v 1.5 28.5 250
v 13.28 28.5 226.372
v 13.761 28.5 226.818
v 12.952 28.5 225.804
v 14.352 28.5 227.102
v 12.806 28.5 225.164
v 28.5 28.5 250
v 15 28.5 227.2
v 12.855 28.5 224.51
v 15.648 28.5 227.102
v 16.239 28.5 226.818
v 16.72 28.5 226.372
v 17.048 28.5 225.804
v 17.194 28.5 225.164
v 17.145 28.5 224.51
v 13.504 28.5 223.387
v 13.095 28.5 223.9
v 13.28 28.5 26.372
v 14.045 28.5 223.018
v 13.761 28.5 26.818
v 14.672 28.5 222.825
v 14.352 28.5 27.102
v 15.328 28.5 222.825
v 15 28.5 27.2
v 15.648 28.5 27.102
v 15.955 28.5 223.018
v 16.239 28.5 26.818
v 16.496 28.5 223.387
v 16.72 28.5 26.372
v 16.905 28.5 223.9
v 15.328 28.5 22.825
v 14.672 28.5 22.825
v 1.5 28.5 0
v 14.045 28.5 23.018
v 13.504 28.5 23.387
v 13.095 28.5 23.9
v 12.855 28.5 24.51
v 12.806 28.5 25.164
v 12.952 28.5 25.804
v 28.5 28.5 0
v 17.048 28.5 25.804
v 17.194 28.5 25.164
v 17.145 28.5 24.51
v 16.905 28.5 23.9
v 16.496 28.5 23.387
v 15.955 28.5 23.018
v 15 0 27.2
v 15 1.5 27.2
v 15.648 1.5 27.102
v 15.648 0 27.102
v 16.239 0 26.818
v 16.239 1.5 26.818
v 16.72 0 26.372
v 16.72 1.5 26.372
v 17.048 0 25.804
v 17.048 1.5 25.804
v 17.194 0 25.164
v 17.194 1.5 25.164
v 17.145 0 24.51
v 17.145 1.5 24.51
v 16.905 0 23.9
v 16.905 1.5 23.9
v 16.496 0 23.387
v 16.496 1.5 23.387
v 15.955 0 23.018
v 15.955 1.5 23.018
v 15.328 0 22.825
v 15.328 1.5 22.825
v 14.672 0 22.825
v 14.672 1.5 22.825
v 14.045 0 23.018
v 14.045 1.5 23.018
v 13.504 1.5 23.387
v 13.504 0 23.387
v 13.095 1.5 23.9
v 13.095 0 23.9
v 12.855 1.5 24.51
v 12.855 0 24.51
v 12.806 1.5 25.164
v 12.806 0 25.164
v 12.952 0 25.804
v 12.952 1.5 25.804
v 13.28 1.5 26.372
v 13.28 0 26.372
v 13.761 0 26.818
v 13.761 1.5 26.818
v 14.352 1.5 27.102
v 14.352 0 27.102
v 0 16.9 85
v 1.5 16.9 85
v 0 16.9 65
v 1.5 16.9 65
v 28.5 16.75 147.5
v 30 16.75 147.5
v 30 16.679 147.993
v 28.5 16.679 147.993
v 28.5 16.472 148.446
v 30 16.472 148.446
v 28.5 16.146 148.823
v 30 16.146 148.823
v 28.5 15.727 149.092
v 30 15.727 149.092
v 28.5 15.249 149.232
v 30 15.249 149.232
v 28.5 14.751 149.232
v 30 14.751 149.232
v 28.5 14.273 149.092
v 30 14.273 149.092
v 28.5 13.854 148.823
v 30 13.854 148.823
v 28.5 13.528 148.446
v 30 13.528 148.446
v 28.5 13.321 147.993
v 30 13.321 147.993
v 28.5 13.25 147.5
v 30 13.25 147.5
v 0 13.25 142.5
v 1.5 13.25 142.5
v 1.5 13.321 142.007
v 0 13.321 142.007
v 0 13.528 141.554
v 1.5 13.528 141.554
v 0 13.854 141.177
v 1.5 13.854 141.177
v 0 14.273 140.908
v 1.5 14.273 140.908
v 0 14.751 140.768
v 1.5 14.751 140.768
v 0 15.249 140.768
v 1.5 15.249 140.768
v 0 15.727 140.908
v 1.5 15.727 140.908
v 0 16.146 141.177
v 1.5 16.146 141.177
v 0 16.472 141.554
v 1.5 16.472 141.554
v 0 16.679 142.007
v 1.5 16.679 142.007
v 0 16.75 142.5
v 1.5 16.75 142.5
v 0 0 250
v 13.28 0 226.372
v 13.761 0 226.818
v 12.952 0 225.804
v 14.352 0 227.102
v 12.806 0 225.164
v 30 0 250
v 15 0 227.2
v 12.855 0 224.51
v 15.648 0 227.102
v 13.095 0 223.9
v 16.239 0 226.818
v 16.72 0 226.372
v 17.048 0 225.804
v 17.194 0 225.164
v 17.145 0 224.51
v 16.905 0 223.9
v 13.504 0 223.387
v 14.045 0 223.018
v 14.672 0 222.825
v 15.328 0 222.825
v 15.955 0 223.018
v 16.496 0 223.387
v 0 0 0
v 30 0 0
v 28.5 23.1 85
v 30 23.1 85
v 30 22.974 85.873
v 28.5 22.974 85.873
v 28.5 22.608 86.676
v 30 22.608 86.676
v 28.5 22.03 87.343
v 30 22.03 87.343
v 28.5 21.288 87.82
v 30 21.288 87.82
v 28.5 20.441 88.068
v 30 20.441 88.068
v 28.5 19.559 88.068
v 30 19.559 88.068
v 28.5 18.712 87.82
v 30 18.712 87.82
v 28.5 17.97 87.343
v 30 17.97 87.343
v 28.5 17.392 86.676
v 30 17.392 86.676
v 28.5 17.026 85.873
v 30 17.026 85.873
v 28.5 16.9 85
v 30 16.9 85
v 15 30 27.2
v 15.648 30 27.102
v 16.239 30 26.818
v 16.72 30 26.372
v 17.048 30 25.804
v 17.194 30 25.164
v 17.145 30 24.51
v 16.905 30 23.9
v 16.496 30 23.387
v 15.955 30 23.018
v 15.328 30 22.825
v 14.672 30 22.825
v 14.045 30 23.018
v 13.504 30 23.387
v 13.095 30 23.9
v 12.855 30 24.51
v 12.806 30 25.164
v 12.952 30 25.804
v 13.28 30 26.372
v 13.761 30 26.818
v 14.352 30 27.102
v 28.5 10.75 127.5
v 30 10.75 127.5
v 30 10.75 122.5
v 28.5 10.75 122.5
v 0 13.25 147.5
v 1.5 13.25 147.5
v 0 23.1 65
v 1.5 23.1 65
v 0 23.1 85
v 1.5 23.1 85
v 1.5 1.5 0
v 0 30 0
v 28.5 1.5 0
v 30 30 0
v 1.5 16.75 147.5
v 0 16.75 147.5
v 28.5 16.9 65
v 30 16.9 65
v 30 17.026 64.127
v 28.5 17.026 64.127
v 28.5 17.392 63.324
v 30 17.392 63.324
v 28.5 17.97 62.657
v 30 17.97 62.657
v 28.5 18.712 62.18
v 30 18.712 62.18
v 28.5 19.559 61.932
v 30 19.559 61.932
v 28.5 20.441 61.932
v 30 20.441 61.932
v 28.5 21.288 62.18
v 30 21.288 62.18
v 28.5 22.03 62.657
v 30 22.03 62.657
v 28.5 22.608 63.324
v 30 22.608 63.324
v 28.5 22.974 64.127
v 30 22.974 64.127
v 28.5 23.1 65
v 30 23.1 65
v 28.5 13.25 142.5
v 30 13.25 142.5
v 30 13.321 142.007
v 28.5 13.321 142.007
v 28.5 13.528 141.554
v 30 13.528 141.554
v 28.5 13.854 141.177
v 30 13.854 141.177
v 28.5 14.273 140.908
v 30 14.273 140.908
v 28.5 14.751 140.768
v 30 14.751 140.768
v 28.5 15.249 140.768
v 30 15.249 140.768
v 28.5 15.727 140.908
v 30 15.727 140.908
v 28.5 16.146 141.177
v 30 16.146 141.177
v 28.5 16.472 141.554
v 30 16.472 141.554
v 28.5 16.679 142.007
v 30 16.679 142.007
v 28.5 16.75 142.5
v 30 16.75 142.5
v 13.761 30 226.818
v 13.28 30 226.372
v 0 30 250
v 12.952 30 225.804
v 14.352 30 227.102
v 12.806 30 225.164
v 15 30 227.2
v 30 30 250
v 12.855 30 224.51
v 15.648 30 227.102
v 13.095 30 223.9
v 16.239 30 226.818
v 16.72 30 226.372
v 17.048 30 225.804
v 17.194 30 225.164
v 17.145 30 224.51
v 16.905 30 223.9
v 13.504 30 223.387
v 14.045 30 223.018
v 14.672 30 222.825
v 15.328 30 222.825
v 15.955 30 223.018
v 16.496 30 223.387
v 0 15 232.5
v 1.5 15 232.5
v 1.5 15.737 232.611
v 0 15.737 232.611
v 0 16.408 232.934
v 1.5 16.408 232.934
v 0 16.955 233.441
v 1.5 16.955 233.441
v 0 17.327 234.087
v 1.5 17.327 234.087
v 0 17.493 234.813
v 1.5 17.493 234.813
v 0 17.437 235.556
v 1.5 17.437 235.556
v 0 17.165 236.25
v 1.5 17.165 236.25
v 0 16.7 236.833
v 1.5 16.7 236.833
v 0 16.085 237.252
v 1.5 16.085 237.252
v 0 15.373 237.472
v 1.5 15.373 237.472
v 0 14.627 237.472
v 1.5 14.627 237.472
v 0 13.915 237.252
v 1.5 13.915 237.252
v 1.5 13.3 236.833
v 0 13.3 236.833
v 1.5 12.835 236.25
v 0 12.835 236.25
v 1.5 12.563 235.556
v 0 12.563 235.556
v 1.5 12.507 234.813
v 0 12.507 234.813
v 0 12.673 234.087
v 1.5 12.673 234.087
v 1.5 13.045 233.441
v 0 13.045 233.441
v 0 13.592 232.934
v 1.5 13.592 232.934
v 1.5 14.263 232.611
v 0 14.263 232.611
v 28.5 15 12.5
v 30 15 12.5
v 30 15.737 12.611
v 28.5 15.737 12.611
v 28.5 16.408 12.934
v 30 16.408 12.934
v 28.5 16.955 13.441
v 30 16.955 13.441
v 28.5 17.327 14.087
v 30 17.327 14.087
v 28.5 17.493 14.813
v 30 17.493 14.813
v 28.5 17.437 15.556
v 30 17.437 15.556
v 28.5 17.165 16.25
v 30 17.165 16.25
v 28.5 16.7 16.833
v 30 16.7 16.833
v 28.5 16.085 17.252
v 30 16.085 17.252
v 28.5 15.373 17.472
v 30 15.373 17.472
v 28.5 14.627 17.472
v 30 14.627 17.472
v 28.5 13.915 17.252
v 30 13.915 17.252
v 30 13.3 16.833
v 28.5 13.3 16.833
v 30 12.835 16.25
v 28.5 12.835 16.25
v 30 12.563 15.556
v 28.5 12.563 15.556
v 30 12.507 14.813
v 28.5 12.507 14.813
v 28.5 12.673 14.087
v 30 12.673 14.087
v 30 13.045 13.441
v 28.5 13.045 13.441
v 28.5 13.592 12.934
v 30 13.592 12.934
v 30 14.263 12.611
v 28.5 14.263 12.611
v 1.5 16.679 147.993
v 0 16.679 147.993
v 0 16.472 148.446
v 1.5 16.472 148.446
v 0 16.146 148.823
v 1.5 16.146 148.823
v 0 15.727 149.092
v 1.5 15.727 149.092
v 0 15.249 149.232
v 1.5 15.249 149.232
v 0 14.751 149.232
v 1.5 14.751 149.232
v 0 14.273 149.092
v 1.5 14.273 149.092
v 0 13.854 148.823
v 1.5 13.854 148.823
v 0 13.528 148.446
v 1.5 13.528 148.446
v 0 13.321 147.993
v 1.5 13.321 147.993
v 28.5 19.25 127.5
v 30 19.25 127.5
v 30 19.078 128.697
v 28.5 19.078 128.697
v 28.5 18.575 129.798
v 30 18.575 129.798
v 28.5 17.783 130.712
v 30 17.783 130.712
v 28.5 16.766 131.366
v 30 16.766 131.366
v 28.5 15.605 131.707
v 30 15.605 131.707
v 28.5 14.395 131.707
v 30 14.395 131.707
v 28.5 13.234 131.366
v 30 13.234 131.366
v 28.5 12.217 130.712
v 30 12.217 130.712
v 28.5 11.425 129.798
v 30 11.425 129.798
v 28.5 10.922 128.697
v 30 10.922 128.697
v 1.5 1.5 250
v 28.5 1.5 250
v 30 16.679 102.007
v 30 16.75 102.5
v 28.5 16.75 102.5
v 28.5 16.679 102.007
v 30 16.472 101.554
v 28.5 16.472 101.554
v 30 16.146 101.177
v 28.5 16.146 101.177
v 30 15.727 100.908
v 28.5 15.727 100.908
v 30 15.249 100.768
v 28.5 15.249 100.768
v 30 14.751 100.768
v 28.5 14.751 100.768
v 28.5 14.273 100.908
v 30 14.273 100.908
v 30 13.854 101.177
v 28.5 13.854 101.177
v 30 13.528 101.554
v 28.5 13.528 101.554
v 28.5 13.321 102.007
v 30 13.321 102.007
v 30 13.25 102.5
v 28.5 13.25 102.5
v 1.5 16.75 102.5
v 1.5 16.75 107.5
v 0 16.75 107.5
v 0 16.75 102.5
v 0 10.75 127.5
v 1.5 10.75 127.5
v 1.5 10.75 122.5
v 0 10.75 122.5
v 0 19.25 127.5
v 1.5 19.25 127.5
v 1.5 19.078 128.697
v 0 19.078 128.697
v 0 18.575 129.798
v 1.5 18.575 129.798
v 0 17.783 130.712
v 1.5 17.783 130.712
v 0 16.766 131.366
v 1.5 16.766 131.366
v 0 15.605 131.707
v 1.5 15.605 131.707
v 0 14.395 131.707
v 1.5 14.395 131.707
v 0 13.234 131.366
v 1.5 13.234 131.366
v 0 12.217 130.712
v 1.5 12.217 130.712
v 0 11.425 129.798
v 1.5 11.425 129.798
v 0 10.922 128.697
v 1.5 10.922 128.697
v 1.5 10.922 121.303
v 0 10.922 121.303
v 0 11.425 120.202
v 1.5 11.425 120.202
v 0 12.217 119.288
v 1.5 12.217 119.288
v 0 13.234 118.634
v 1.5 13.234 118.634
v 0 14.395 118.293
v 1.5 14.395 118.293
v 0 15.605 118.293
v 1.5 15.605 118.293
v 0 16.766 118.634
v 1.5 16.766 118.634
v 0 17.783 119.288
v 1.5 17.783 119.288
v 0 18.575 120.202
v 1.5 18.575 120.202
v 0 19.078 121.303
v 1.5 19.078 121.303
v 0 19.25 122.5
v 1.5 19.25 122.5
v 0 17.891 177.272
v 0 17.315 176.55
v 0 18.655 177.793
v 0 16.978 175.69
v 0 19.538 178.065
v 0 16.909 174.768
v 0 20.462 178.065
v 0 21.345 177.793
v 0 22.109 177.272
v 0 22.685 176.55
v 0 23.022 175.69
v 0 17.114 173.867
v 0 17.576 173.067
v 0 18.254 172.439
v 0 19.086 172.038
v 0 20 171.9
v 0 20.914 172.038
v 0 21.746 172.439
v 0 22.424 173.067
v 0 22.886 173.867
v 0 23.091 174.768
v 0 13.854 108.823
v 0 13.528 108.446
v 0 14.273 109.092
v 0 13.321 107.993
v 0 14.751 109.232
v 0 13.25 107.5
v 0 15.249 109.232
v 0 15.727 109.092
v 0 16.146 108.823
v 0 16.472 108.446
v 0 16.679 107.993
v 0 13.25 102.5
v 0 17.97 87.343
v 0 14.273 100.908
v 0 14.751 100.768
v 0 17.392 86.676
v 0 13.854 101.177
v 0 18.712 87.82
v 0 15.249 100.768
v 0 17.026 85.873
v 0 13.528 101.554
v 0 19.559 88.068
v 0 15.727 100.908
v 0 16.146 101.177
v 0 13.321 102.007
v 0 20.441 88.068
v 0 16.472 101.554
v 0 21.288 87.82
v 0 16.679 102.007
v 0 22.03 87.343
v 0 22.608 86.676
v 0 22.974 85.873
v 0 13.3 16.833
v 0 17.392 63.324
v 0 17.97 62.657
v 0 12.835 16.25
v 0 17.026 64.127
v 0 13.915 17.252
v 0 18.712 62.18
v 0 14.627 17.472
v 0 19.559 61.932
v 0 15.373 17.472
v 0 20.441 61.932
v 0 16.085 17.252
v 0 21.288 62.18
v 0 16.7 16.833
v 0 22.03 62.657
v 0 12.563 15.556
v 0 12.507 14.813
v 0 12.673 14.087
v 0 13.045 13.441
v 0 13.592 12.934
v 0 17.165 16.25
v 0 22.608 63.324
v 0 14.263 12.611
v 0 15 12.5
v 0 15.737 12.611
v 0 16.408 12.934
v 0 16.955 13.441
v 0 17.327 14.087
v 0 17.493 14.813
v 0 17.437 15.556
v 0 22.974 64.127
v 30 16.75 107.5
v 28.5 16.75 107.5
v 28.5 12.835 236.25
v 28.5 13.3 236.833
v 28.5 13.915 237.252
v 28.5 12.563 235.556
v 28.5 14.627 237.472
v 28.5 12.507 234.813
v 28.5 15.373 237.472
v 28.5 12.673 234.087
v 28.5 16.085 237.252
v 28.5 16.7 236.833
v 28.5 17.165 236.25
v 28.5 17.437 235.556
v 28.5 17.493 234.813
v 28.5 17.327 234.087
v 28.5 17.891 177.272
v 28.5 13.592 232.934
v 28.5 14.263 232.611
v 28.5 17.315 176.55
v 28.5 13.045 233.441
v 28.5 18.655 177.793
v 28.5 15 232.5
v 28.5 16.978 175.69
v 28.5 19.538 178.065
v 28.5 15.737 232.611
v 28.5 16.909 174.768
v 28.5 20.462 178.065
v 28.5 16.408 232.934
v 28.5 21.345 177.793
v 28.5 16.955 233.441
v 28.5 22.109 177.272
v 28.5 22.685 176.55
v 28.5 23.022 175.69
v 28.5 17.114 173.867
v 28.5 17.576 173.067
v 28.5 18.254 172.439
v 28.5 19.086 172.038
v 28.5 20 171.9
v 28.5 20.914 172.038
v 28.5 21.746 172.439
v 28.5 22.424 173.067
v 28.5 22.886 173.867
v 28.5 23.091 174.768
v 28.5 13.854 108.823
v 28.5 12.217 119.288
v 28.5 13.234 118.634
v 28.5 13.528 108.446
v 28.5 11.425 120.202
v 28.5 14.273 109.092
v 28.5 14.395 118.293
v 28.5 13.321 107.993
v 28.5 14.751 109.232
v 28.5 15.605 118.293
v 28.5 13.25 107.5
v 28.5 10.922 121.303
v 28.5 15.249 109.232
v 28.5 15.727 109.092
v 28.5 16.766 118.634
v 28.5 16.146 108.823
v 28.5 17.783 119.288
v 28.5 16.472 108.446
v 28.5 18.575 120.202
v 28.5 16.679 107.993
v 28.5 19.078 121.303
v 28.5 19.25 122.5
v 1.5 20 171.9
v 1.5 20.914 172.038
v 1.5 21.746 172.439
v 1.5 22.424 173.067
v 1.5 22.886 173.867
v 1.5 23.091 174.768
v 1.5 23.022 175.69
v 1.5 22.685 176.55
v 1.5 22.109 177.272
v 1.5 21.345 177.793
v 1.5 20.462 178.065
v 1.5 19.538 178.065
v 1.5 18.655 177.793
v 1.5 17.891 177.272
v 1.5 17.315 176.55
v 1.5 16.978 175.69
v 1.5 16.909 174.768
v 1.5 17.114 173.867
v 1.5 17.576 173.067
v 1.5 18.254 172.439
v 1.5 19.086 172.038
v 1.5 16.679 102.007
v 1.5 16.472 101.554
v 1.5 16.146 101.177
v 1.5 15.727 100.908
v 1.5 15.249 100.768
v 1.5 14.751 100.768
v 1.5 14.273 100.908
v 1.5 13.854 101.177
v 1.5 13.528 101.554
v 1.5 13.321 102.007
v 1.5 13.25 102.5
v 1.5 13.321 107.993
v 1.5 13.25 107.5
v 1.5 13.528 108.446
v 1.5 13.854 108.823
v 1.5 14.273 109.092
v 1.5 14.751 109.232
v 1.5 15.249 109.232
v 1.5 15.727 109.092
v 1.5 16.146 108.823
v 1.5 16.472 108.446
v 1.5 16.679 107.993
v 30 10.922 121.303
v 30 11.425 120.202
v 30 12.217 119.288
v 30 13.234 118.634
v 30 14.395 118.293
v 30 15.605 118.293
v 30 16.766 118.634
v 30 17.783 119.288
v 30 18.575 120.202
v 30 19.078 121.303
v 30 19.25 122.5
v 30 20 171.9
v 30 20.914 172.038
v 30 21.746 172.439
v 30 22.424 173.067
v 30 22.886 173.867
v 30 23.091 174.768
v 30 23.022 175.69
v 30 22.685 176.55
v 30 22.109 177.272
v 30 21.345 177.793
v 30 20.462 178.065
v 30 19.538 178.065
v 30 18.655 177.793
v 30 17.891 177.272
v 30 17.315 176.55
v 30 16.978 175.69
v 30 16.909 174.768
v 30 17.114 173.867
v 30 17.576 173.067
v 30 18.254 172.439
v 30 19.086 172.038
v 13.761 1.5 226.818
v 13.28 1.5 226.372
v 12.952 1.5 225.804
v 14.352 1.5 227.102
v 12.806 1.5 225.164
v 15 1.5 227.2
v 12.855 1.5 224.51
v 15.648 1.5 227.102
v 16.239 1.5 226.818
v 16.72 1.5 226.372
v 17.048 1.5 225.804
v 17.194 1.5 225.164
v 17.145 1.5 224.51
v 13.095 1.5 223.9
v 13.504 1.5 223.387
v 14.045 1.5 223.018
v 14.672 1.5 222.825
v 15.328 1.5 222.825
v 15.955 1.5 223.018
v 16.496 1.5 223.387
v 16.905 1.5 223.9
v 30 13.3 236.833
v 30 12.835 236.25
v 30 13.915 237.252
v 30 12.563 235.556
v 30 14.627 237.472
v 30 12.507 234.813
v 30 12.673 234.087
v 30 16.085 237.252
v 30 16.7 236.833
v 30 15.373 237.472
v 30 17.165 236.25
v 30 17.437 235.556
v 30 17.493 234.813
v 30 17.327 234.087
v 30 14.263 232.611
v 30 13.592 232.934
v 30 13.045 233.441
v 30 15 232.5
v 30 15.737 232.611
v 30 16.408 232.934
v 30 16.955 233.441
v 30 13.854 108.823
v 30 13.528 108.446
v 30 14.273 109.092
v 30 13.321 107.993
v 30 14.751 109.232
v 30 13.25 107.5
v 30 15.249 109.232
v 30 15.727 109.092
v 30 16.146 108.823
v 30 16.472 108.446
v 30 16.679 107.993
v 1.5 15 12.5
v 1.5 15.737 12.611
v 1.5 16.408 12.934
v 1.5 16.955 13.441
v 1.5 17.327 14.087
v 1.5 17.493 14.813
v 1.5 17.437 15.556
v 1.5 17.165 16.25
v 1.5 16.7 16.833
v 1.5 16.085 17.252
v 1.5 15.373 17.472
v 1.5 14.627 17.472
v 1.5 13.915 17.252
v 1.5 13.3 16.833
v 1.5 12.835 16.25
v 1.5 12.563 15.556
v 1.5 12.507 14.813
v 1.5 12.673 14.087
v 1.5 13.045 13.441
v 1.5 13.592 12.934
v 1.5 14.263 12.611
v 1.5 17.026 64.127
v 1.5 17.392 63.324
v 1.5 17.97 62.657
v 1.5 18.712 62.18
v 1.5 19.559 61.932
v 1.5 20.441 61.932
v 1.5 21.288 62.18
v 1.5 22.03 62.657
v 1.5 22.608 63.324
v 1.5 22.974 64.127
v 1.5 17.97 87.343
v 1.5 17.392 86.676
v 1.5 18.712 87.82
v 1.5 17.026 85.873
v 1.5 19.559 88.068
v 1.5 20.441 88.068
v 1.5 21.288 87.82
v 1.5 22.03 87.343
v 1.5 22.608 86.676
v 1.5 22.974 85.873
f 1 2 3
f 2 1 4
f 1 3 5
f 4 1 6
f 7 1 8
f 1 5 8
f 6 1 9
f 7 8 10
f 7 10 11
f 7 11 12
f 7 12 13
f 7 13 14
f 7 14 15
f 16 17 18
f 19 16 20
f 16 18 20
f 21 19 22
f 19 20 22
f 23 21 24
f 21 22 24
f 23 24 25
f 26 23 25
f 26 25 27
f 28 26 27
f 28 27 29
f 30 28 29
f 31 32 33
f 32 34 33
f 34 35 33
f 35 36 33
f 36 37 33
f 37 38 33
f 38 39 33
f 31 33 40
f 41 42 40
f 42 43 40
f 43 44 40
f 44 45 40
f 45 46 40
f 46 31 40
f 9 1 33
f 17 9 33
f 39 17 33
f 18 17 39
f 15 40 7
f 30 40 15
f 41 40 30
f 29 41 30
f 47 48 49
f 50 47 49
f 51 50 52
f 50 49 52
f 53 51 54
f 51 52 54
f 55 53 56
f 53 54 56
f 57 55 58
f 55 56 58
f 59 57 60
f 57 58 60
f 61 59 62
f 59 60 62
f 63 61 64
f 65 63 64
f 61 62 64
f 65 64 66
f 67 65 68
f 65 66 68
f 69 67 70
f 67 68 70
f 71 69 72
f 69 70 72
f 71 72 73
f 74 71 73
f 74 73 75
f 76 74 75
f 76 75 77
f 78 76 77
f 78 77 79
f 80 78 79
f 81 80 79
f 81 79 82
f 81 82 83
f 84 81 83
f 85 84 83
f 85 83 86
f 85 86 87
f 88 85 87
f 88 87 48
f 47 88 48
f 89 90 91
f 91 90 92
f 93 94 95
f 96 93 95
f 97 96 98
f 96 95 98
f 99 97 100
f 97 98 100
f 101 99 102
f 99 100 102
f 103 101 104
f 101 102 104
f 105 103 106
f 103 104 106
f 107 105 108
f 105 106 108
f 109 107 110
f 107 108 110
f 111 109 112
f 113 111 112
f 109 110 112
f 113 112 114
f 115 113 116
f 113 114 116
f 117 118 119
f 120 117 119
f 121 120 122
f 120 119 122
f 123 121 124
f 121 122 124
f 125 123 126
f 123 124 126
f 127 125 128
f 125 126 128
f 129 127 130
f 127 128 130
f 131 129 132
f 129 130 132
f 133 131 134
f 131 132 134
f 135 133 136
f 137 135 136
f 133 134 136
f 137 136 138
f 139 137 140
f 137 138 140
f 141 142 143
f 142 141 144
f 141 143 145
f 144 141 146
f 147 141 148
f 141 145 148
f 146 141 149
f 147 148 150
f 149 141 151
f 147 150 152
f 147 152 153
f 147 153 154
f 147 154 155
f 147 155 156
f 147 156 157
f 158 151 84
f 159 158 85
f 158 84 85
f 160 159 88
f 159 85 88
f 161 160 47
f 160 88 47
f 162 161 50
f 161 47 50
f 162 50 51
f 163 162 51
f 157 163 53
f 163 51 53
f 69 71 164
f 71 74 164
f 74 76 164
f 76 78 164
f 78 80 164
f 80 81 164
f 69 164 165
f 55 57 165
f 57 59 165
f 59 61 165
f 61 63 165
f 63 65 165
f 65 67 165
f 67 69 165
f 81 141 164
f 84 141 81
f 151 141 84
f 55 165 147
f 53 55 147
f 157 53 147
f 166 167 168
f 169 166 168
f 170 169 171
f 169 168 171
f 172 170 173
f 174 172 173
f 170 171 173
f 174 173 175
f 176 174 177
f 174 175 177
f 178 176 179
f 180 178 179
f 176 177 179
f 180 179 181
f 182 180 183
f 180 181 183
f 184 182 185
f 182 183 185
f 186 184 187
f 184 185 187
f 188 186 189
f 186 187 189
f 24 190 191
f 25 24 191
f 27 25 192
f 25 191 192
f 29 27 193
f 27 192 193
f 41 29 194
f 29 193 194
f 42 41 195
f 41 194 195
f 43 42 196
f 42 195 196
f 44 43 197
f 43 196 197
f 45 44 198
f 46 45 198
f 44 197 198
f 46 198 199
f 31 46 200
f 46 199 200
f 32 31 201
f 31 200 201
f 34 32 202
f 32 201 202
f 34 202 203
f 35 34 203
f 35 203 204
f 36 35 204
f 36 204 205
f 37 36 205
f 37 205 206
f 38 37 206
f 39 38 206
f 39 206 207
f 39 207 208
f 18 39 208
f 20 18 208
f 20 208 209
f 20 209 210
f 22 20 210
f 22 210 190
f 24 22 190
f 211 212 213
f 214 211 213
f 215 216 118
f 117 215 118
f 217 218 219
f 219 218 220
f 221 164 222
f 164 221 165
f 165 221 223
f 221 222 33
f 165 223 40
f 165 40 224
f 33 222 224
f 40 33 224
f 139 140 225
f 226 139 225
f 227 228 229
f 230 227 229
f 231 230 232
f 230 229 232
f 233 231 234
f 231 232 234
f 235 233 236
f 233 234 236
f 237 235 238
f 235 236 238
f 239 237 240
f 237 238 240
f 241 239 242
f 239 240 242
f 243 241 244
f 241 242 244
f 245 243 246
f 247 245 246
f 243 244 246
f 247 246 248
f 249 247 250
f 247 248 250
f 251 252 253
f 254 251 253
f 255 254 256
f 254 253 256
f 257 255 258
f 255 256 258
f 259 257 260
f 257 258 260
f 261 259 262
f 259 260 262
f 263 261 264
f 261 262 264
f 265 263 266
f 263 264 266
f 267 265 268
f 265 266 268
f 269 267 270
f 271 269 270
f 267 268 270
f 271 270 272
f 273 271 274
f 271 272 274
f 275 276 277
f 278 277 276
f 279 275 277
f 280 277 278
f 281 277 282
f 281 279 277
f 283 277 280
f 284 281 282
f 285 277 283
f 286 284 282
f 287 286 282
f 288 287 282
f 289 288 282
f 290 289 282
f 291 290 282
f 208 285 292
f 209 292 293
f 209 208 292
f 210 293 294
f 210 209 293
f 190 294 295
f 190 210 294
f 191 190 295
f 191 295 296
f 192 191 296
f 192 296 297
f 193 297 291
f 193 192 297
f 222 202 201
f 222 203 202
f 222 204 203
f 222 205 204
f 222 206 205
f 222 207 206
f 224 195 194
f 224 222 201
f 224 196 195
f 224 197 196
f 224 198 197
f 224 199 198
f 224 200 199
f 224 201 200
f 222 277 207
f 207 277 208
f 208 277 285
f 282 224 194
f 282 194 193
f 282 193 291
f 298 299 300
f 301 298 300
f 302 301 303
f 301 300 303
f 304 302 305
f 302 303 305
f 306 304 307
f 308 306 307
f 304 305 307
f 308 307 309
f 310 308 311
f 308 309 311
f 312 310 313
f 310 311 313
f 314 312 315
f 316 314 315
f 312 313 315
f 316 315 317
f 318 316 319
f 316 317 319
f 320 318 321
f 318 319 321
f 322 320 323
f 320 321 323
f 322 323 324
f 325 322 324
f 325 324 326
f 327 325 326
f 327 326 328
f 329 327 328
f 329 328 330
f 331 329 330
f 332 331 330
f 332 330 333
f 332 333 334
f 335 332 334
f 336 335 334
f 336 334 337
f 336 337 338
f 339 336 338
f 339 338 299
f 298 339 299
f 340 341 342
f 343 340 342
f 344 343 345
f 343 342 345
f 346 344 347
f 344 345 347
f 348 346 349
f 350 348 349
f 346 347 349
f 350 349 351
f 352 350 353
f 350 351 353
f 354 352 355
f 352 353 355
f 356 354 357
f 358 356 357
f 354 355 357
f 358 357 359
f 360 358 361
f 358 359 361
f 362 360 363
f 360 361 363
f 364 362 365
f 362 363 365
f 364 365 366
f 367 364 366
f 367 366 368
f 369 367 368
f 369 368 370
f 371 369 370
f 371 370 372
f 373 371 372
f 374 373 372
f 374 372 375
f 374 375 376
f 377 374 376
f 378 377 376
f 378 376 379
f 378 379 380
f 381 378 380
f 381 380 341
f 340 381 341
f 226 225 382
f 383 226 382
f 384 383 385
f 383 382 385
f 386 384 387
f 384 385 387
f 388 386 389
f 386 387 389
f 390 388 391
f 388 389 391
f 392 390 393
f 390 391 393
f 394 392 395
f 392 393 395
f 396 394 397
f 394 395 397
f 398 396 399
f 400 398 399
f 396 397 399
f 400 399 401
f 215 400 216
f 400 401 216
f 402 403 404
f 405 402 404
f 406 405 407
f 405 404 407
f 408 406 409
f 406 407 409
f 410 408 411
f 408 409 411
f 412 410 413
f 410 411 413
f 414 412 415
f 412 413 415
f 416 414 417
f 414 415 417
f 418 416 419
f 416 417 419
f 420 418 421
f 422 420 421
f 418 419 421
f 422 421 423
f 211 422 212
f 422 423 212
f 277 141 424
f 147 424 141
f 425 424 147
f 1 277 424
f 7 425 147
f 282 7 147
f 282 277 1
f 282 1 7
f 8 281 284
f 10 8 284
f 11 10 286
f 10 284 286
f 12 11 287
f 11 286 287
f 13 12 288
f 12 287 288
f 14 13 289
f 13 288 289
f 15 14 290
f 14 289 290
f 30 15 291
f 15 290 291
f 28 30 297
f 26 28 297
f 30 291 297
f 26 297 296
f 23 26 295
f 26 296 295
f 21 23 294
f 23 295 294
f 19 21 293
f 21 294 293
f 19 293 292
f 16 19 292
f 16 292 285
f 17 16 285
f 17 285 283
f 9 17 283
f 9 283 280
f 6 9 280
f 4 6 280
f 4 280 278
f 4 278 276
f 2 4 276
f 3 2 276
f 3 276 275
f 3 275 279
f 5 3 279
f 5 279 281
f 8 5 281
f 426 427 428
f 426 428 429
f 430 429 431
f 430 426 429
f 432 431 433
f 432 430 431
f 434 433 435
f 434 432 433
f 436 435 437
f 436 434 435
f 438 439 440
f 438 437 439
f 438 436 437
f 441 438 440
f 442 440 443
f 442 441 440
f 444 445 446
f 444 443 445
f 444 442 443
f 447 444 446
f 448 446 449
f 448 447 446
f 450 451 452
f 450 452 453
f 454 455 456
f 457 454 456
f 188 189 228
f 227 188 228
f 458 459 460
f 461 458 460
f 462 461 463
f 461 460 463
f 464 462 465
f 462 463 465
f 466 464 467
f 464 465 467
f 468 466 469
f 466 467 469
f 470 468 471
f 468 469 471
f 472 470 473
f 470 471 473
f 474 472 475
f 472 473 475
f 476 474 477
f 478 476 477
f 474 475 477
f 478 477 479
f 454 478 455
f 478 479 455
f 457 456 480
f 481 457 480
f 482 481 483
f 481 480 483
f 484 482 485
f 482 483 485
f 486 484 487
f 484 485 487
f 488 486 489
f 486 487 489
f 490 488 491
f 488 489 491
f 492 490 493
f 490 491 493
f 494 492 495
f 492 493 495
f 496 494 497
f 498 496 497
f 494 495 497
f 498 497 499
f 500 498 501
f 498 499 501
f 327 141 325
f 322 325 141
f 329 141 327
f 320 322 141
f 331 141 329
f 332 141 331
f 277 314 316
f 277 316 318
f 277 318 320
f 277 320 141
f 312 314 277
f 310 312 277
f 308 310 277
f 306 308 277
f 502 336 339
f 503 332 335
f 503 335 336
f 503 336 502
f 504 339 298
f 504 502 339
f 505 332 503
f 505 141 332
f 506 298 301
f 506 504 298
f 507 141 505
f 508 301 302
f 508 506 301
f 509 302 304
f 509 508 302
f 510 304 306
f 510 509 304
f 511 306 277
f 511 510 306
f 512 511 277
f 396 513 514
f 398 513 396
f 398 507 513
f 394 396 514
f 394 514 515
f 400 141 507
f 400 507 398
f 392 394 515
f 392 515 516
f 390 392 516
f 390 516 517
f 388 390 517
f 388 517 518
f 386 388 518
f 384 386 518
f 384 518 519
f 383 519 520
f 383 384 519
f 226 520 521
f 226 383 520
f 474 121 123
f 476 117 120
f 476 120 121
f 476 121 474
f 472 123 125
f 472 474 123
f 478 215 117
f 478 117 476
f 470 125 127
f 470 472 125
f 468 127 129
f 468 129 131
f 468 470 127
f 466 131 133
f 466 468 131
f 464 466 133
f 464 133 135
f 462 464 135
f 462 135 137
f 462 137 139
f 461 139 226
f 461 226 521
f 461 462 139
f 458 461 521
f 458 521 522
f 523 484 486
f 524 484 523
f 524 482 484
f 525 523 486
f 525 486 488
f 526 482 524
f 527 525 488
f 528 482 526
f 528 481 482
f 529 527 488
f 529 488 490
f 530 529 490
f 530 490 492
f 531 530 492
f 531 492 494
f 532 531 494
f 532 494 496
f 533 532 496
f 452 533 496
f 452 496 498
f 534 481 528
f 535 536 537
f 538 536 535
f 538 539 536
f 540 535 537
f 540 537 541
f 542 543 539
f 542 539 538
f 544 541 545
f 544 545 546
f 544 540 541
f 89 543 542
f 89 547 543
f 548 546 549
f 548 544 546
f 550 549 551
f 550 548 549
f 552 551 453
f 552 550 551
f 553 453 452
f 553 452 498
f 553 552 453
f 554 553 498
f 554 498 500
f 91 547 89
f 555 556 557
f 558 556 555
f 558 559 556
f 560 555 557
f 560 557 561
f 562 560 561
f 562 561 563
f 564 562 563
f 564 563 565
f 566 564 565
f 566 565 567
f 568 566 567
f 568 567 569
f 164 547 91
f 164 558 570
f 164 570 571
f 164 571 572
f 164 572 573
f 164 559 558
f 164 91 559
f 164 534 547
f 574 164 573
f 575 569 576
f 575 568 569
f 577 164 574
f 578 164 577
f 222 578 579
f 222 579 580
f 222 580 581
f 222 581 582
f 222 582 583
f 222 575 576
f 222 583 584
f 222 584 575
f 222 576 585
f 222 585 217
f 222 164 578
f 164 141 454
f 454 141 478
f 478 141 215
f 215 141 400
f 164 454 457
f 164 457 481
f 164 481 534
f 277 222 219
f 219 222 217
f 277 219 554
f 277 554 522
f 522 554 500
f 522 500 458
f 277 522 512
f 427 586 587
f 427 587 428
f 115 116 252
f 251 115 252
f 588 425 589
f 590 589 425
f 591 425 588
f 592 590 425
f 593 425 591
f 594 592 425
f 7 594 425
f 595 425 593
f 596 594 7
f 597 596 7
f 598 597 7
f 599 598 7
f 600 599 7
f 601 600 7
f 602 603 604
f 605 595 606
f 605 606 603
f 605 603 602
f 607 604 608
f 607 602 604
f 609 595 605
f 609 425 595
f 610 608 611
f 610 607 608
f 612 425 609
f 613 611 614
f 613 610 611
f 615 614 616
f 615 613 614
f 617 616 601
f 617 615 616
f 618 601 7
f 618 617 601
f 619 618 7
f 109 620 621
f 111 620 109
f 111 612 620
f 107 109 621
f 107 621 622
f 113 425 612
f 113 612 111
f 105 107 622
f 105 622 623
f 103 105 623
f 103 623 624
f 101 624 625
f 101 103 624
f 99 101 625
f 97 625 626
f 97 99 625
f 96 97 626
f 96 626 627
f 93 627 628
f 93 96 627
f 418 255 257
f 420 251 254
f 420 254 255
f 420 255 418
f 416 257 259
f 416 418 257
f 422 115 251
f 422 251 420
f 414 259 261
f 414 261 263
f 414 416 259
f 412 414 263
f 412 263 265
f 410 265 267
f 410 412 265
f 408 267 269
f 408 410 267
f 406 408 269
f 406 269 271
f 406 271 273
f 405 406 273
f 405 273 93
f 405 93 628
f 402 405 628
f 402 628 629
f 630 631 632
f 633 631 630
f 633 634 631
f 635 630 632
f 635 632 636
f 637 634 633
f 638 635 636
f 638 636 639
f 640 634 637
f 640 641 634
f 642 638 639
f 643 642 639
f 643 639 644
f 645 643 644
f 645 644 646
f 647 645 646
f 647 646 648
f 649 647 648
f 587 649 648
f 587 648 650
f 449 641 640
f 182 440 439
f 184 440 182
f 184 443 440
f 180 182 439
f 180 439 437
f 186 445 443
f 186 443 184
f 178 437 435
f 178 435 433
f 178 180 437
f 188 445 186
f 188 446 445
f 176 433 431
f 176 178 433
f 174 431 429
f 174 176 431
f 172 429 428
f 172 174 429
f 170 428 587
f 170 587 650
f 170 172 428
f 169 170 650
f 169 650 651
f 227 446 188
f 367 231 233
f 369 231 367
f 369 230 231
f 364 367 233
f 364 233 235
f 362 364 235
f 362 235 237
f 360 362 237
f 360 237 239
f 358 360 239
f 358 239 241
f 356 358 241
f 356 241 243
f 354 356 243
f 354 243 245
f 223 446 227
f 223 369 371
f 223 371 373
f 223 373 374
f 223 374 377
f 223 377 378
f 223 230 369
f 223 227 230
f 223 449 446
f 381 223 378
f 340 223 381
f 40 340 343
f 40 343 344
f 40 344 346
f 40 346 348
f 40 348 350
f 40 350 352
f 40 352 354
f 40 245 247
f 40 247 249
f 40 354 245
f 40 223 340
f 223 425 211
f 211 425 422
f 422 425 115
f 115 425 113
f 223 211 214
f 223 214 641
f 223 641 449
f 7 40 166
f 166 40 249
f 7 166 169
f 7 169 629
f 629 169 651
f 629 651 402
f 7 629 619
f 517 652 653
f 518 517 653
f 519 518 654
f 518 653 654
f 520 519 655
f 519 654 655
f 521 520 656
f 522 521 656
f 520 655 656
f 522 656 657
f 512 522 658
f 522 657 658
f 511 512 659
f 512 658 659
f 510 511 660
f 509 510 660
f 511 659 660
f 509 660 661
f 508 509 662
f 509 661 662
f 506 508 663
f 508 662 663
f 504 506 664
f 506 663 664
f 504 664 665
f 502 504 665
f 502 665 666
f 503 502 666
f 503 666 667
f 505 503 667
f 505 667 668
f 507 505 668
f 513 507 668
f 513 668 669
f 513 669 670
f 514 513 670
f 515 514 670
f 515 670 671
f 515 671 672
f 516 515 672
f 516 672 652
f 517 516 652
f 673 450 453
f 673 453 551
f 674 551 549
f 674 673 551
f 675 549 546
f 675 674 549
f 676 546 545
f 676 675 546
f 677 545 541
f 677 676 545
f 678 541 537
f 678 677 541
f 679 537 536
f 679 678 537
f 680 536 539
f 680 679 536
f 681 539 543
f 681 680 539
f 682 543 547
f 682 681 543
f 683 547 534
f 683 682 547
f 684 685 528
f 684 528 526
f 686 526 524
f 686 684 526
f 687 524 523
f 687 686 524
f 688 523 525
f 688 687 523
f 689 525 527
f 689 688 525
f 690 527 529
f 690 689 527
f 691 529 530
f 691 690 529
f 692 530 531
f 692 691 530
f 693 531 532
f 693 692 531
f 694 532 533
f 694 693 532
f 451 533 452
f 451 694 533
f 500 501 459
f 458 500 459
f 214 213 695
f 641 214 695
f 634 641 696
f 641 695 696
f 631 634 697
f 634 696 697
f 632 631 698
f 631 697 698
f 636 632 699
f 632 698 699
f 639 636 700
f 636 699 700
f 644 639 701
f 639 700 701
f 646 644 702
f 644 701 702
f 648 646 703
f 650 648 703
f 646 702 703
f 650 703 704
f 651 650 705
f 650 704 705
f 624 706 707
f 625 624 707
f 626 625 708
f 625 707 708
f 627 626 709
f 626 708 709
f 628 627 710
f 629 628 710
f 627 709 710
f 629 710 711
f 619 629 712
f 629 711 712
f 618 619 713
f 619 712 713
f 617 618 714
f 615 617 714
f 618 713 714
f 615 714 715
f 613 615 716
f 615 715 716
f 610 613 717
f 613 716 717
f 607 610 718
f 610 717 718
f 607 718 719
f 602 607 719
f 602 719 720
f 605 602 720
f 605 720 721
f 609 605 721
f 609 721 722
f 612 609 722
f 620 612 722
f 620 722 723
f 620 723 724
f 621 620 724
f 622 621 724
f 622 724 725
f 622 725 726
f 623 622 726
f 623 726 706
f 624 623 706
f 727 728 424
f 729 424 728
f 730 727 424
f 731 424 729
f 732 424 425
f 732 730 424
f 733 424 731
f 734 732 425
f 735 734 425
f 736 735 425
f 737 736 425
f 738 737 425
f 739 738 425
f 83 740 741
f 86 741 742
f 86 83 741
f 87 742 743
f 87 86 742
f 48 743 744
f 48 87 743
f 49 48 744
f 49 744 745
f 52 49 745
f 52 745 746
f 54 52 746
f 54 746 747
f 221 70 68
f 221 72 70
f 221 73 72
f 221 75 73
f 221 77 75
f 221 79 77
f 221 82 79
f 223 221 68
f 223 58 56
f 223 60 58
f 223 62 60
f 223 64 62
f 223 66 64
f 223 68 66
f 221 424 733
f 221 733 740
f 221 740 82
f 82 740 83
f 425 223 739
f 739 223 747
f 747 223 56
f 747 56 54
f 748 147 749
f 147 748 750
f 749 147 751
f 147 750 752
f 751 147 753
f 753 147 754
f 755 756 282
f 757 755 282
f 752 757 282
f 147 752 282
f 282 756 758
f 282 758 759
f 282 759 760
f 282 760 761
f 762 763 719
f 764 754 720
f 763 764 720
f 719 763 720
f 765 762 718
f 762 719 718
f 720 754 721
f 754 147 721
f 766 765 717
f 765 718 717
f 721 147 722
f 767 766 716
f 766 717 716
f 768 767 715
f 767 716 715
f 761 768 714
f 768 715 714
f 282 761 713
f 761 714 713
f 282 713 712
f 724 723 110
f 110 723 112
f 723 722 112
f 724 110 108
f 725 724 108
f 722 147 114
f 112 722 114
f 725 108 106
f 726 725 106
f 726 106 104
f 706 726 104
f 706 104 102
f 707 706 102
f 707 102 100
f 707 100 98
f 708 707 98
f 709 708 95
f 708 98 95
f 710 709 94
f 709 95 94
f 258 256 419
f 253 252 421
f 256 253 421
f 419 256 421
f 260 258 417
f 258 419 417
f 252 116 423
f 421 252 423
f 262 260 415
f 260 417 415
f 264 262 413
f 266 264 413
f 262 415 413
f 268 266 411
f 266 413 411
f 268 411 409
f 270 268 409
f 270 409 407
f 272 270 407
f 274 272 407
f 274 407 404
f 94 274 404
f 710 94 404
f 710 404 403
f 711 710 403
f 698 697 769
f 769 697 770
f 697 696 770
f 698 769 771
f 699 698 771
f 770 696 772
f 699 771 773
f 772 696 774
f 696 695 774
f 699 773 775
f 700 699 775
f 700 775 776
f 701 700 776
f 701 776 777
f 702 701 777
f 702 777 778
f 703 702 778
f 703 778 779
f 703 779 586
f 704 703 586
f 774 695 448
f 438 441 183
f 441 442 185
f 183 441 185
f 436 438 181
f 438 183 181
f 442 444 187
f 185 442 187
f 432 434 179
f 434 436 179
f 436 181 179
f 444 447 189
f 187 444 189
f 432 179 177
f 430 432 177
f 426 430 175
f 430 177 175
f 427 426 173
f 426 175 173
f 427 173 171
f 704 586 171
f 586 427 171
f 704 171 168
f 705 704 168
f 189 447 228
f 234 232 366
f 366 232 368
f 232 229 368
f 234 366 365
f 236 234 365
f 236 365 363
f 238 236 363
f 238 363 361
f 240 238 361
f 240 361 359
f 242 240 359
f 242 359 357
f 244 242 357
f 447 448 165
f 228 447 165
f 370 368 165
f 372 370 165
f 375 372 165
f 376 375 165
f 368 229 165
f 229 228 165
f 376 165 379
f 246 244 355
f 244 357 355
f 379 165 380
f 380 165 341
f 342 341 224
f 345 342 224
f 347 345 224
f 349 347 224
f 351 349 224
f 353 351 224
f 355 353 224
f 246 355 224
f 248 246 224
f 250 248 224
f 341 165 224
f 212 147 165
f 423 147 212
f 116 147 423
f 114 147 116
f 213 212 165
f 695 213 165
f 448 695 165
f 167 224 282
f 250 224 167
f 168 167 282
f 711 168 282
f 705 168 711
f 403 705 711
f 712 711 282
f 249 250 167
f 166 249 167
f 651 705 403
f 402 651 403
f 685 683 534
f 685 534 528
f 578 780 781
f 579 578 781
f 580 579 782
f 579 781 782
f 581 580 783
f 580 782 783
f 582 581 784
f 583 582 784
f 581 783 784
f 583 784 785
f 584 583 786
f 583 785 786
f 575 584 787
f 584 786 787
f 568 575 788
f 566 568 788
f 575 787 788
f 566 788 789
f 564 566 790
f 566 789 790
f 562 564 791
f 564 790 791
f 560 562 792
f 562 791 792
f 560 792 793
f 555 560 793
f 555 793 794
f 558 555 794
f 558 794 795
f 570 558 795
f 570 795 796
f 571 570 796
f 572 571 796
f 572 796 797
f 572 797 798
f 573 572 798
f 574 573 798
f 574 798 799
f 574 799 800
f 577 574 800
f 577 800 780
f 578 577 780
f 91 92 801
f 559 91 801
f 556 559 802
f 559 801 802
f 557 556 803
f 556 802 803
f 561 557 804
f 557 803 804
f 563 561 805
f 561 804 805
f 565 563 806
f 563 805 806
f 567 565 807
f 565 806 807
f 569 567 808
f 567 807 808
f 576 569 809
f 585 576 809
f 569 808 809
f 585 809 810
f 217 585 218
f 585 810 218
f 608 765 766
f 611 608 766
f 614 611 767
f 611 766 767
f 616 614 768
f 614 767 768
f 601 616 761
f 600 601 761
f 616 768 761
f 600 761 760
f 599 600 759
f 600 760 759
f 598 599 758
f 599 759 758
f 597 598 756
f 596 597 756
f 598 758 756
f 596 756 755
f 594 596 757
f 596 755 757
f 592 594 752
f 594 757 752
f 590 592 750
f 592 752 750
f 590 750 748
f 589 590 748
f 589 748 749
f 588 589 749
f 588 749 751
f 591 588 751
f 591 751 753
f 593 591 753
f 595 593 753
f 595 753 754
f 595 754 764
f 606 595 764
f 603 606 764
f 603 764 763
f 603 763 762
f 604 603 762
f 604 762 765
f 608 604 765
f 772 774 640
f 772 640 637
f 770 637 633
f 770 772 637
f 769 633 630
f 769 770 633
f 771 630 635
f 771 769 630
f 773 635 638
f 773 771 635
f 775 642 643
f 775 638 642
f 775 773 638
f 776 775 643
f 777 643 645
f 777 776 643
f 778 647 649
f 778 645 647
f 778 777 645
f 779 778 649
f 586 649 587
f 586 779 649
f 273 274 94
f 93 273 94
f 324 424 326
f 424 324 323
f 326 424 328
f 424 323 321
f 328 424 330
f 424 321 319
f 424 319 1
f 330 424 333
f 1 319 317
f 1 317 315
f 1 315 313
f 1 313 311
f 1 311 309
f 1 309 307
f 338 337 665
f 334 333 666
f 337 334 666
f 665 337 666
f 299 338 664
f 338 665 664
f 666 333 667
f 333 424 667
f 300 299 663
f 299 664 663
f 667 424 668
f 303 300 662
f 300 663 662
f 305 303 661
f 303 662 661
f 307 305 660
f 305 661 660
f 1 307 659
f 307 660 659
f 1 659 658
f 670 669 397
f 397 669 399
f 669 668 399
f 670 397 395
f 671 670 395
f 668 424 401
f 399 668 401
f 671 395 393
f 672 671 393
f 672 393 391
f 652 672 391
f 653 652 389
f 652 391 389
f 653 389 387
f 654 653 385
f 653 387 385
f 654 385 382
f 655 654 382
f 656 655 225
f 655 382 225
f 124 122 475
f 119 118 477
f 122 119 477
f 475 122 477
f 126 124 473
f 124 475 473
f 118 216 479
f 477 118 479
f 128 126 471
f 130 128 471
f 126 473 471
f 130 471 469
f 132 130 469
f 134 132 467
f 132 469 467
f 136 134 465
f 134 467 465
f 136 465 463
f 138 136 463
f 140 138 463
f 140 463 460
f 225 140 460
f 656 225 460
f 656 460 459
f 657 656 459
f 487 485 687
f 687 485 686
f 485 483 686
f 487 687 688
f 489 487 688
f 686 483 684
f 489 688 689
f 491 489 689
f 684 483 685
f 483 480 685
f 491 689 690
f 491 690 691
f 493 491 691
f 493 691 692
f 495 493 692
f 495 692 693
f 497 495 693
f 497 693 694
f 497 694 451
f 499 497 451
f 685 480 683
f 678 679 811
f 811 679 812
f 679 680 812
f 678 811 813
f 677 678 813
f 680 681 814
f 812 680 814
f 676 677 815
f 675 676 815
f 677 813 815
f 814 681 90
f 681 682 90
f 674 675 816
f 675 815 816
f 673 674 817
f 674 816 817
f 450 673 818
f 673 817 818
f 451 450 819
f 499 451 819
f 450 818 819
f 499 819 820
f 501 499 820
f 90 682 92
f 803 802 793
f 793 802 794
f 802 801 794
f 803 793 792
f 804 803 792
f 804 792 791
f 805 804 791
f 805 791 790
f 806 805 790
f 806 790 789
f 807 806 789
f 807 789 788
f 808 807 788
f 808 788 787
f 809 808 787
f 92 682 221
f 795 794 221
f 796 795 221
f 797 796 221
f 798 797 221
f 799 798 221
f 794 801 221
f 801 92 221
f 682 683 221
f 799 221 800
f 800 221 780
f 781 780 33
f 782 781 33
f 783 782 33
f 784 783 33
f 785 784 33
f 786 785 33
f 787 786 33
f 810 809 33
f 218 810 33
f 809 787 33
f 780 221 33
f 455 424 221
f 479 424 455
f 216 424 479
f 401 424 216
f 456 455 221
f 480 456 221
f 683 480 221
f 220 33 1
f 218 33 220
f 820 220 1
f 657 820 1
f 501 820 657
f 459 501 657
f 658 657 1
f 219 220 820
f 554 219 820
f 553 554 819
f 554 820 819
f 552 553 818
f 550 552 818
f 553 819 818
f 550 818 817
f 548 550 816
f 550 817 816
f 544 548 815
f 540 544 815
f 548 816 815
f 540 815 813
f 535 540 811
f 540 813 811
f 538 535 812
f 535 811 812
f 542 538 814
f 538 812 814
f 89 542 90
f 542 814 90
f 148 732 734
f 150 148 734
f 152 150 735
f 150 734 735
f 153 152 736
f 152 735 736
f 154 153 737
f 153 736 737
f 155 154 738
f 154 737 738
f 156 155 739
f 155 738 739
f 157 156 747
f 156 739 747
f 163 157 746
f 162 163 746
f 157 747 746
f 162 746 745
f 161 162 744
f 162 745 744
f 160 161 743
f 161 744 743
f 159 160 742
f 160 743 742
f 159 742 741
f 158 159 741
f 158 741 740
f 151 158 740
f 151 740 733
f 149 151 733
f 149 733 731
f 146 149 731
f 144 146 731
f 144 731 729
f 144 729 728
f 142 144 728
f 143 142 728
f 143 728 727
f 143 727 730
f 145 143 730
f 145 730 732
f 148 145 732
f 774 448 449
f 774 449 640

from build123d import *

# Parameters (mm, degrees)
SKETCH1_W           = 30
SKETCH1_H           = 30
SKETCH1_W_2         = 27
SKETCH1_H_2         = 27
BOSS_EXTRUDE1_DEPTH = 250
SKETCH2_R           = 2.5
SKETCH2_R_2         = 3.1
CUT_EXTRUDE1_DEPTH  = 254.574446662
SKETCH3_R           = 2.2
CUT_EXTRUDE2_DEPTH  = 254.574446662


with BuildPart() as part:
    # Sketch1 → Boss-Extrude1 (new body)
    with BuildSketch(Plane.XY):
        with Locations((15, 15)):
            Rectangle(SKETCH1_W, SKETCH1_H)
        with Locations((15, 15)):
            Rectangle(SKETCH1_W_2, SKETCH1_H_2, mode=Mode.SUBTRACT)
    extrude(amount=BOSS_EXTRUDE1_DEPTH)

    # Sketch2 → Cut-Extrude1 (cut, through all)
    with BuildSketch(Plane(origin=(30, 0, 0), x_dir=(0, 0, -1), z_dir=(1, 0, 0))):
        with Locations((-15, 15)):
            Circle(SKETCH2_R)
        with Locations((-235, 15)):
            Circle(SKETCH2_R)
        with Locations((-175, 20)):
            Circle(SKETCH2_R_2)
        with BuildLine():
            Line((-142.5, 16.75), (-147.5, 16.75))
            ThreePointArc((-147.5, 16.75), (-149.25, 15), (-147.5, 13.25))
            Line((-147.5, 13.25), (-142.5, 13.25))
            ThreePointArc((-142.5, 13.25), (-140.75, 15), (-142.5, 16.75))
        make_face()
        with BuildLine():
            Line((-107.5, 16.75), (-102.5, 16.75))
            ThreePointArc((-102.5, 16.75), (-100.75, 15), (-102.5, 13.25))
            Line((-102.5, 13.25), (-107.5, 13.25))
            ThreePointArc((-107.5, 13.25), (-109.25, 15), (-107.5, 16.75))
        make_face()
        with BuildLine():
            Line((-125, 19.25), (-127.5, 19.25))
            ThreePointArc((-127.5, 19.25), (-131.75, 15), (-127.5, 10.75))
            Line((-127.5, 10.75), (-125, 10.75))
            Line((-125, 10.75), (-122.5, 10.75))
            ThreePointArc((-122.5, 10.75), (-118.25, 15), (-122.5, 19.25))
            Line((-122.5, 19.25), (-125, 19.25))
        make_face()
        with BuildLine():
            Line((-75, 23.1), (-85, 23.1))
            ThreePointArc((-85, 23.1), (-88.1, 20), (-85, 16.9))
            Line((-85, 16.9), (-75, 16.9))
            Line((-75, 16.9), (-65, 16.9))
            ThreePointArc((-65, 16.9), (-61.9, 20), (-65, 23.1))
            Line((-65, 23.1), (-75, 23.1))
        make_face()
    extrude(amount=-CUT_EXTRUDE1_DEPTH, mode=Mode.SUBTRACT)

    # Sketch3 → Cut-Extrude2 (cut, through all)
    with BuildSketch(Plane(origin=(0, 30, 0), x_dir=(1, 0, 0), z_dir=(0, 1, 0))):
        with Locations(Location((15, -25, 0), (0, 0, 270))):
            Circle(SKETCH3_R)
        with Locations(Location((15, -225, 0), (0, 0, 270))):
            Circle(SKETCH3_R)
    extrude(amount=-CUT_EXTRUDE2_DEPTH, mode=Mode.SUBTRACT)


solid = part.part
